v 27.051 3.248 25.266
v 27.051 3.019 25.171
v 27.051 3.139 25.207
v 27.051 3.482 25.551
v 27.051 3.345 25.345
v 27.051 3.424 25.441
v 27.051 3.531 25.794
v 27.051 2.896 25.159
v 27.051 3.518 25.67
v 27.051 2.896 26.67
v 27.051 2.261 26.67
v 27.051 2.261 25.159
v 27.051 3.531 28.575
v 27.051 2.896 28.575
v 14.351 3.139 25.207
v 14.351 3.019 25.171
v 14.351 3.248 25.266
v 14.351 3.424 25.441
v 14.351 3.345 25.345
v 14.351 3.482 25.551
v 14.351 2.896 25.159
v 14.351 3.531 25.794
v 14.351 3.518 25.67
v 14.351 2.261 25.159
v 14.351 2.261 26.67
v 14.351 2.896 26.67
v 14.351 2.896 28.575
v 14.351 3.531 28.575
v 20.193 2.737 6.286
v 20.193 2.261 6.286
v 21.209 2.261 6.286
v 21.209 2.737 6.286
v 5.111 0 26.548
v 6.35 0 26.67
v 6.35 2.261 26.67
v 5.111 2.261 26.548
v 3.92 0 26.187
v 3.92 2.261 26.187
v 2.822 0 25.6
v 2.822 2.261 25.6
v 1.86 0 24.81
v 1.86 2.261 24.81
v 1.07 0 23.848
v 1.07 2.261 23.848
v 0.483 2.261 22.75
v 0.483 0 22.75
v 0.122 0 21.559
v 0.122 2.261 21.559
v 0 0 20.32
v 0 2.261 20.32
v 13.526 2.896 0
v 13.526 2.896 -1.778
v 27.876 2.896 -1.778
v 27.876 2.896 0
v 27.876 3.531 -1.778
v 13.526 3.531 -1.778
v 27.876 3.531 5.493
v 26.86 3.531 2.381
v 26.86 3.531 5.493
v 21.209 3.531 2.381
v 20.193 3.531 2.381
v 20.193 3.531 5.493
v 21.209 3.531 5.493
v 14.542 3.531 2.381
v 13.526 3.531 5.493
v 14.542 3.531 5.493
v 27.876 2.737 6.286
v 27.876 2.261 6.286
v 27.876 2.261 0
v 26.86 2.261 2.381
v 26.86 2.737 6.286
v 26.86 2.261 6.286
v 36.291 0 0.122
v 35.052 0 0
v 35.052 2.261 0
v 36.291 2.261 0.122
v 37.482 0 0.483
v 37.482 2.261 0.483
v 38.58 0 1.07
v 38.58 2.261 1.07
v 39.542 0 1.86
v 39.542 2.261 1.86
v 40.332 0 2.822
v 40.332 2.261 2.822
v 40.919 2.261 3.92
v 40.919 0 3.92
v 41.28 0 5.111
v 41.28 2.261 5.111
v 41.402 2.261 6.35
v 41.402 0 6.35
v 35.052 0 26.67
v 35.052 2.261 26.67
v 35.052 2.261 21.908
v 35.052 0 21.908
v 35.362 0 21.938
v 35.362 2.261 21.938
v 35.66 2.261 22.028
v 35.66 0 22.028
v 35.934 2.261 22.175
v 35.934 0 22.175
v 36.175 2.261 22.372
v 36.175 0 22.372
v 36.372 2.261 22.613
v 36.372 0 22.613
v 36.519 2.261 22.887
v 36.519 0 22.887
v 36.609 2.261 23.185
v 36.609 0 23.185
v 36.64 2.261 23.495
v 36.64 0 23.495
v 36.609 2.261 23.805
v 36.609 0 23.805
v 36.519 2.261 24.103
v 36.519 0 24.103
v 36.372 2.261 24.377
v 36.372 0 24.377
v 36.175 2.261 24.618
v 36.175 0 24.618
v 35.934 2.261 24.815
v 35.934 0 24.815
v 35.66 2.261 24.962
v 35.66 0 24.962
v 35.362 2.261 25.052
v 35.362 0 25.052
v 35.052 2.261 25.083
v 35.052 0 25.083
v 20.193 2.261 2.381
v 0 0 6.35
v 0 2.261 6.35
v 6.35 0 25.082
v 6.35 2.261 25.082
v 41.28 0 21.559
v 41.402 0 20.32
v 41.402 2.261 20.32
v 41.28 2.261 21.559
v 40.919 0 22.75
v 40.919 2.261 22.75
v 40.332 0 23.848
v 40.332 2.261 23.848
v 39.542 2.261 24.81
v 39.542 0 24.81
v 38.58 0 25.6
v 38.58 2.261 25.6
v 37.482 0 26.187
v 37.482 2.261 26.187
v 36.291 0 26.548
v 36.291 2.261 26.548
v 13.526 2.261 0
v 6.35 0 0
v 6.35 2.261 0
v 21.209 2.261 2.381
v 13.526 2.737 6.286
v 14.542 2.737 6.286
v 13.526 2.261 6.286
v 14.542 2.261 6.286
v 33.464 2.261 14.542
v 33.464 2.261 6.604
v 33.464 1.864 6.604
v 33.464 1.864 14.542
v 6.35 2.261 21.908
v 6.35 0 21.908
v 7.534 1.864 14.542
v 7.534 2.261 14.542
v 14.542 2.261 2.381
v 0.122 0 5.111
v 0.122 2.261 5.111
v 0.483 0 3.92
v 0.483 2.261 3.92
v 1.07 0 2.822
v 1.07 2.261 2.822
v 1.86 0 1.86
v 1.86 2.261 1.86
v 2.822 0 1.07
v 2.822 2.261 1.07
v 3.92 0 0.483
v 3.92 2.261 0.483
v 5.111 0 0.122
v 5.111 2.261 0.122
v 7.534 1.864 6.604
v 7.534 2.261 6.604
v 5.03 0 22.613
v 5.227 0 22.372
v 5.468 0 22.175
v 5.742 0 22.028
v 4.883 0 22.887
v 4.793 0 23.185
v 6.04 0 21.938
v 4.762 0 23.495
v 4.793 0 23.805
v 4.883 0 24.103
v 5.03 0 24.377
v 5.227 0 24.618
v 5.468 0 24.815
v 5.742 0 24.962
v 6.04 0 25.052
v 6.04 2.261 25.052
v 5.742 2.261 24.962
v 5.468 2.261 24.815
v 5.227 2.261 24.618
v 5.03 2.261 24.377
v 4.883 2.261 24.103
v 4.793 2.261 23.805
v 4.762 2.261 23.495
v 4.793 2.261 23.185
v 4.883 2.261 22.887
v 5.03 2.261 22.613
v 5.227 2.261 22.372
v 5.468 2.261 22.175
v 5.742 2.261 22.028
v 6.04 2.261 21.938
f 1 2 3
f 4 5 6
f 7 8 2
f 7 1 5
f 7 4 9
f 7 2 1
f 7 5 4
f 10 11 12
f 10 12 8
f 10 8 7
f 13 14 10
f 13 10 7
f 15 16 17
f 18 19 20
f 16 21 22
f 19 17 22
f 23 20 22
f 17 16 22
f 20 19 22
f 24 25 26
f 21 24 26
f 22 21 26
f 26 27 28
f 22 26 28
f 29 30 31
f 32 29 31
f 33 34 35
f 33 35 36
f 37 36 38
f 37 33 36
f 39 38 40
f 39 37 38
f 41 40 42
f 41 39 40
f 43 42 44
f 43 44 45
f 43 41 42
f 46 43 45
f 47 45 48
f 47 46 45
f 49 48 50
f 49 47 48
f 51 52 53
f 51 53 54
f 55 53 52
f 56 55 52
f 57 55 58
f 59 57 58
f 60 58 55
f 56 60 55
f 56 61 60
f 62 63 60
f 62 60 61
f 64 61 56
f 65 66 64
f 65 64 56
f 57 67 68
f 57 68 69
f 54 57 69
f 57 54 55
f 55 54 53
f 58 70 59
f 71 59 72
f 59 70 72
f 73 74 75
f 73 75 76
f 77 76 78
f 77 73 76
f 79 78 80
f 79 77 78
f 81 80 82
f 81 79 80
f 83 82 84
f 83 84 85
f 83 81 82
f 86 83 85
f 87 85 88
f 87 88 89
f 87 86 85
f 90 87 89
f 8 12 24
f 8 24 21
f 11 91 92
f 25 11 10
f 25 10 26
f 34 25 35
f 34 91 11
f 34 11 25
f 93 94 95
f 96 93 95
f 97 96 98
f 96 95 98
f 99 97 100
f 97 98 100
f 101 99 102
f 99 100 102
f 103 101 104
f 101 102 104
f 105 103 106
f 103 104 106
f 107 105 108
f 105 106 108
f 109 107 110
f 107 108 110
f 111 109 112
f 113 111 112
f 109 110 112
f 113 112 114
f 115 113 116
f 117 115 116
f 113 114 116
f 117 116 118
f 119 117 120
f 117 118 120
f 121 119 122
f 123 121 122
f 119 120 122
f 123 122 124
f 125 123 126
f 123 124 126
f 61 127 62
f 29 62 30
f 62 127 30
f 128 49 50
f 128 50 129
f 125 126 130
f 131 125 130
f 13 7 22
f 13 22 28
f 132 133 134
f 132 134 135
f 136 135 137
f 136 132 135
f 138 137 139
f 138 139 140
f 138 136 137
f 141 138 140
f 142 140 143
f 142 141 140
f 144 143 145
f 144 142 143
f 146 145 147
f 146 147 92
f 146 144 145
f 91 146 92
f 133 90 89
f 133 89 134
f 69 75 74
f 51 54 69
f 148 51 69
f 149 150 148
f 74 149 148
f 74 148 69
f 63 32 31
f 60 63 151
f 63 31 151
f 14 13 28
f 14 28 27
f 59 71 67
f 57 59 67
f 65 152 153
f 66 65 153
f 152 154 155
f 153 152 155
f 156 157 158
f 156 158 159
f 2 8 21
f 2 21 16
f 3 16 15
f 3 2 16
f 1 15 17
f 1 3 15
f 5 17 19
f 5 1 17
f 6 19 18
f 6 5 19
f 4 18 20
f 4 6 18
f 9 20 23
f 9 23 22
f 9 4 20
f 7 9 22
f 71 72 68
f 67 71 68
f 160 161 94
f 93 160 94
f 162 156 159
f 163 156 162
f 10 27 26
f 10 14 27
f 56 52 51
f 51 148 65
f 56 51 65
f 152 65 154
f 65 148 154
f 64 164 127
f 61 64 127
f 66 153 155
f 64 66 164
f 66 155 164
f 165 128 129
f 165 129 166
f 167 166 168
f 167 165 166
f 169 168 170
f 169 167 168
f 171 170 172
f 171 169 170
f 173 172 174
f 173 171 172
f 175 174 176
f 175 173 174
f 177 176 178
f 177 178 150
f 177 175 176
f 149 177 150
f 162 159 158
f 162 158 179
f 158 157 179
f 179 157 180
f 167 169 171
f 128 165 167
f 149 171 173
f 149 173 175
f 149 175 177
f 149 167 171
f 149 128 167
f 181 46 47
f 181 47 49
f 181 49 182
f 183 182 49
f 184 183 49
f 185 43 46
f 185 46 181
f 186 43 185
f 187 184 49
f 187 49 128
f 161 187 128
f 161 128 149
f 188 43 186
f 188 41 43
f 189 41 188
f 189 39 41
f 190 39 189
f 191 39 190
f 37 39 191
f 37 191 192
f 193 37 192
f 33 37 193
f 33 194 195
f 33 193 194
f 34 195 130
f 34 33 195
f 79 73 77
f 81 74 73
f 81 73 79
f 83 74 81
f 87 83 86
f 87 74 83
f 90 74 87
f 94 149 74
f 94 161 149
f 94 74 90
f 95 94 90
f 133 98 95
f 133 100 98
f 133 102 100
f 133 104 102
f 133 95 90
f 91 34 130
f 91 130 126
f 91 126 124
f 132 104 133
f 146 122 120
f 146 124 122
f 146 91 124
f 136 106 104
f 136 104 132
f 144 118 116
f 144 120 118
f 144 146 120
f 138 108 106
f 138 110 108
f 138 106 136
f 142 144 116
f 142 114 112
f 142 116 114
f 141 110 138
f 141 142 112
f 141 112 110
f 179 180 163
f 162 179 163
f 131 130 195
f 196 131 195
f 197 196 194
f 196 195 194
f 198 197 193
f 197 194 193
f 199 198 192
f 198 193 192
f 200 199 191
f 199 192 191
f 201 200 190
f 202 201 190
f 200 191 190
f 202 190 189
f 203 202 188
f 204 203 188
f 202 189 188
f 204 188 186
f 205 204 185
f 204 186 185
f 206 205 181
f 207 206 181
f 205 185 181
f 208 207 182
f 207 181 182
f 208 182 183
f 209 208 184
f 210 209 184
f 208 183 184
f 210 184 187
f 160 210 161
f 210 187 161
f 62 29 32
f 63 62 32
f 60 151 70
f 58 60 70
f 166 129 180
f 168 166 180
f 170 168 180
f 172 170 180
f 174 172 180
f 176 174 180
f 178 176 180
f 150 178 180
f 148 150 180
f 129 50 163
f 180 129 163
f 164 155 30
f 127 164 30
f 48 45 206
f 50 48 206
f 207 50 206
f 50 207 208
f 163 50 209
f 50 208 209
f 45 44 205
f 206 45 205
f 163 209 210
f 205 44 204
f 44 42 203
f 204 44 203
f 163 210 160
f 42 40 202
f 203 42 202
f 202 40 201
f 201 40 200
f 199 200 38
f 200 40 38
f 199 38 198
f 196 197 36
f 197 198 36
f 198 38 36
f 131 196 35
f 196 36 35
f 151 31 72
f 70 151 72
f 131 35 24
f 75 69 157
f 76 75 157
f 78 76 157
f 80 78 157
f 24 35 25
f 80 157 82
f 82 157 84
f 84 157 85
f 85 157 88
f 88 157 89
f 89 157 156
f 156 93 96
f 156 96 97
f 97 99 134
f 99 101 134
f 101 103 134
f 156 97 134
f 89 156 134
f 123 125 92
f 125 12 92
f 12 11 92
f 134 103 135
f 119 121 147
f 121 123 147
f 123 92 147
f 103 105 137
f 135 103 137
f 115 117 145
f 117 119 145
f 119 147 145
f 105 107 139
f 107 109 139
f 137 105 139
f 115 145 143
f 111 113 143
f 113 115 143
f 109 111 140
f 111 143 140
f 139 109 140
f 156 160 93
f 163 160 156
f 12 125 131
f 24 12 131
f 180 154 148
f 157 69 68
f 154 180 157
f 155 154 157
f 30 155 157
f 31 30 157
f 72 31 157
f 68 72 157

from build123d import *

# Parameters (mm, degrees)
F1_DEPTH  = 2.2606
F2_W      = 25.9304894134
F2_H      = 7.9375
F3_DEPTH  = 0.396875
F4_W      = 14.351
F4_H      = 1.778
F5_DEPTH  = 1.27
F6_SIZE   = 0.79375
F10_DEPTH = 2.2606
F12_DEPTH = 6.35
F13_W     = 0.635
F13_H     = 1.778
F14_DEPTH = 27.8775


# Not quite as in the source:
# - a feature names something its author has since deleted; it is built from what else it names


with BuildPart() as f1:
    # F0 (on Front) → F1 (new body)
    with BuildSketch(Plane.XZ):
        with BuildLine():
            ThreePointArc((0, 6.35), (1.8598719395, 1.8598719395), (6.35, 0))
            Line((6.35, 0), (35.052, 0))
            ThreePointArc((35.052, 0), (39.5421280605, 1.8598719395), (41.402, 6.35))
            Line((41.402, 6.35), (41.402, 20.32))
            ThreePointArc((41.402, 20.32), (39.5421280605, 24.8101280605), (35.052, 26.67))
            Line((35.052, 26.67), (6.35, 26.67))
            ThreePointArc((6.35, 26.67), (1.8598719395, 24.8101280605), (0, 20.32))
            Line((0, 20.32), (0, 6.35))
        make_face()
    extrude(amount=-F1_DEPTH)

    # F2 (on face) → F3 (cut)
    with BuildSketch(Plane(origin=(0, 2.2606, 0), x_dir=(-1, 0, 0), z_dir=(0, 1, 0))):
        with Locations((-20.4992552933, 10.57275)):
            Rectangle(F2_W, F2_H)
    extrude(amount=-F3_DEPTH, mode=Mode.SUBTRACT)

    # F4 (on face) → F5 (join)
    with BuildSketch(Plane(origin=(0, 2.2606, 0), x_dir=(-1, 0, 0), z_dir=(0, 1, 0))):
        with Locations((-20.701, -0.889)):
            Rectangle(F4_W, F4_H)
        Polygon((-21.209, 2.38125), (-26.8605, 2.38125), (-26.8605, 6.2865), (-27.8765, 6.2865), (-27.8765, 0), (-13.5255, 0), (-13.5255, 6.2865), (-14.5415, 6.2865), (-14.5415, 2.38125), (-20.193, 2.38125), (-20.193, 6.2865), (-21.209, 6.2865), align=None)
    extrude(amount=F5_DEPTH)

    # F6
    f6_edges = [f1.edges().sort_by_distance(p)[0] for p in [
        (27.3685, 3.5306, 6.2865),
        (20.701, 3.5306, 6.2865),
        (14.0335, 3.5306, 6.2865),
    ]]
    chamfer(f6_edges, length=F6_SIZE)

    # F9 (on Front) → F10 (cut, through all)
    with BuildSketch(Plane.XZ):
        with BuildLine():
            Line((6.35, 21.9075), (35.052, 21.9075))
            ThreePointArc((35.052, 21.9075), (36.6395, 23.495), (35.052, 25.0825))
            Line((35.052, 25.0825), (6.35, 25.0825))
            ThreePointArc((6.35, 25.0825), (4.7625, 23.495), (6.35, 21.9075))
        make_face()
    extrude(amount=-F10_DEPTH, mode=Mode.SUBTRACT)

    # F11 (on face) → F12 (join, symmetric)
    with BuildSketch(Plane.YZ.offset(20.701)):
        with BuildLine():
            Line((2.2606, 26.67), (2.2606, 25.1591298729))
            Line((2.2606, 25.1591298729), (2.8956, 25.1591298729))
            ThreePointArc((2.8956, 25.1591298729), (3.3446128061, 25.3451170669), (3.5306, 25.7941298729))
            Line((3.5306, 25.7941298729), (3.5306, 26.67))
            Line((3.5306, 26.67), (3.5306, 28.575))
            Line((3.5306, 28.575), (2.8956, 28.575))
            Line((2.8956, 28.575), (2.8956, 26.67))
            Line((2.8956, 26.67), (2.2606, 26.67))
        make_face()
    extrude(amount=F12_DEPTH, both=True)

    # F13 (on face) → F14 (cut, through all)
    with BuildSketch(Plane(origin=(13.5255, 0, 0), x_dir=(0, -1, 0), z_dir=(-1, 0, 0))):
        with Locations((-2.5781, -0.889)):
            Rectangle(F13_W, F13_H)
    extrude(amount=-F14_DEPTH, mode=Mode.SUBTRACT)


solid = f1.part
